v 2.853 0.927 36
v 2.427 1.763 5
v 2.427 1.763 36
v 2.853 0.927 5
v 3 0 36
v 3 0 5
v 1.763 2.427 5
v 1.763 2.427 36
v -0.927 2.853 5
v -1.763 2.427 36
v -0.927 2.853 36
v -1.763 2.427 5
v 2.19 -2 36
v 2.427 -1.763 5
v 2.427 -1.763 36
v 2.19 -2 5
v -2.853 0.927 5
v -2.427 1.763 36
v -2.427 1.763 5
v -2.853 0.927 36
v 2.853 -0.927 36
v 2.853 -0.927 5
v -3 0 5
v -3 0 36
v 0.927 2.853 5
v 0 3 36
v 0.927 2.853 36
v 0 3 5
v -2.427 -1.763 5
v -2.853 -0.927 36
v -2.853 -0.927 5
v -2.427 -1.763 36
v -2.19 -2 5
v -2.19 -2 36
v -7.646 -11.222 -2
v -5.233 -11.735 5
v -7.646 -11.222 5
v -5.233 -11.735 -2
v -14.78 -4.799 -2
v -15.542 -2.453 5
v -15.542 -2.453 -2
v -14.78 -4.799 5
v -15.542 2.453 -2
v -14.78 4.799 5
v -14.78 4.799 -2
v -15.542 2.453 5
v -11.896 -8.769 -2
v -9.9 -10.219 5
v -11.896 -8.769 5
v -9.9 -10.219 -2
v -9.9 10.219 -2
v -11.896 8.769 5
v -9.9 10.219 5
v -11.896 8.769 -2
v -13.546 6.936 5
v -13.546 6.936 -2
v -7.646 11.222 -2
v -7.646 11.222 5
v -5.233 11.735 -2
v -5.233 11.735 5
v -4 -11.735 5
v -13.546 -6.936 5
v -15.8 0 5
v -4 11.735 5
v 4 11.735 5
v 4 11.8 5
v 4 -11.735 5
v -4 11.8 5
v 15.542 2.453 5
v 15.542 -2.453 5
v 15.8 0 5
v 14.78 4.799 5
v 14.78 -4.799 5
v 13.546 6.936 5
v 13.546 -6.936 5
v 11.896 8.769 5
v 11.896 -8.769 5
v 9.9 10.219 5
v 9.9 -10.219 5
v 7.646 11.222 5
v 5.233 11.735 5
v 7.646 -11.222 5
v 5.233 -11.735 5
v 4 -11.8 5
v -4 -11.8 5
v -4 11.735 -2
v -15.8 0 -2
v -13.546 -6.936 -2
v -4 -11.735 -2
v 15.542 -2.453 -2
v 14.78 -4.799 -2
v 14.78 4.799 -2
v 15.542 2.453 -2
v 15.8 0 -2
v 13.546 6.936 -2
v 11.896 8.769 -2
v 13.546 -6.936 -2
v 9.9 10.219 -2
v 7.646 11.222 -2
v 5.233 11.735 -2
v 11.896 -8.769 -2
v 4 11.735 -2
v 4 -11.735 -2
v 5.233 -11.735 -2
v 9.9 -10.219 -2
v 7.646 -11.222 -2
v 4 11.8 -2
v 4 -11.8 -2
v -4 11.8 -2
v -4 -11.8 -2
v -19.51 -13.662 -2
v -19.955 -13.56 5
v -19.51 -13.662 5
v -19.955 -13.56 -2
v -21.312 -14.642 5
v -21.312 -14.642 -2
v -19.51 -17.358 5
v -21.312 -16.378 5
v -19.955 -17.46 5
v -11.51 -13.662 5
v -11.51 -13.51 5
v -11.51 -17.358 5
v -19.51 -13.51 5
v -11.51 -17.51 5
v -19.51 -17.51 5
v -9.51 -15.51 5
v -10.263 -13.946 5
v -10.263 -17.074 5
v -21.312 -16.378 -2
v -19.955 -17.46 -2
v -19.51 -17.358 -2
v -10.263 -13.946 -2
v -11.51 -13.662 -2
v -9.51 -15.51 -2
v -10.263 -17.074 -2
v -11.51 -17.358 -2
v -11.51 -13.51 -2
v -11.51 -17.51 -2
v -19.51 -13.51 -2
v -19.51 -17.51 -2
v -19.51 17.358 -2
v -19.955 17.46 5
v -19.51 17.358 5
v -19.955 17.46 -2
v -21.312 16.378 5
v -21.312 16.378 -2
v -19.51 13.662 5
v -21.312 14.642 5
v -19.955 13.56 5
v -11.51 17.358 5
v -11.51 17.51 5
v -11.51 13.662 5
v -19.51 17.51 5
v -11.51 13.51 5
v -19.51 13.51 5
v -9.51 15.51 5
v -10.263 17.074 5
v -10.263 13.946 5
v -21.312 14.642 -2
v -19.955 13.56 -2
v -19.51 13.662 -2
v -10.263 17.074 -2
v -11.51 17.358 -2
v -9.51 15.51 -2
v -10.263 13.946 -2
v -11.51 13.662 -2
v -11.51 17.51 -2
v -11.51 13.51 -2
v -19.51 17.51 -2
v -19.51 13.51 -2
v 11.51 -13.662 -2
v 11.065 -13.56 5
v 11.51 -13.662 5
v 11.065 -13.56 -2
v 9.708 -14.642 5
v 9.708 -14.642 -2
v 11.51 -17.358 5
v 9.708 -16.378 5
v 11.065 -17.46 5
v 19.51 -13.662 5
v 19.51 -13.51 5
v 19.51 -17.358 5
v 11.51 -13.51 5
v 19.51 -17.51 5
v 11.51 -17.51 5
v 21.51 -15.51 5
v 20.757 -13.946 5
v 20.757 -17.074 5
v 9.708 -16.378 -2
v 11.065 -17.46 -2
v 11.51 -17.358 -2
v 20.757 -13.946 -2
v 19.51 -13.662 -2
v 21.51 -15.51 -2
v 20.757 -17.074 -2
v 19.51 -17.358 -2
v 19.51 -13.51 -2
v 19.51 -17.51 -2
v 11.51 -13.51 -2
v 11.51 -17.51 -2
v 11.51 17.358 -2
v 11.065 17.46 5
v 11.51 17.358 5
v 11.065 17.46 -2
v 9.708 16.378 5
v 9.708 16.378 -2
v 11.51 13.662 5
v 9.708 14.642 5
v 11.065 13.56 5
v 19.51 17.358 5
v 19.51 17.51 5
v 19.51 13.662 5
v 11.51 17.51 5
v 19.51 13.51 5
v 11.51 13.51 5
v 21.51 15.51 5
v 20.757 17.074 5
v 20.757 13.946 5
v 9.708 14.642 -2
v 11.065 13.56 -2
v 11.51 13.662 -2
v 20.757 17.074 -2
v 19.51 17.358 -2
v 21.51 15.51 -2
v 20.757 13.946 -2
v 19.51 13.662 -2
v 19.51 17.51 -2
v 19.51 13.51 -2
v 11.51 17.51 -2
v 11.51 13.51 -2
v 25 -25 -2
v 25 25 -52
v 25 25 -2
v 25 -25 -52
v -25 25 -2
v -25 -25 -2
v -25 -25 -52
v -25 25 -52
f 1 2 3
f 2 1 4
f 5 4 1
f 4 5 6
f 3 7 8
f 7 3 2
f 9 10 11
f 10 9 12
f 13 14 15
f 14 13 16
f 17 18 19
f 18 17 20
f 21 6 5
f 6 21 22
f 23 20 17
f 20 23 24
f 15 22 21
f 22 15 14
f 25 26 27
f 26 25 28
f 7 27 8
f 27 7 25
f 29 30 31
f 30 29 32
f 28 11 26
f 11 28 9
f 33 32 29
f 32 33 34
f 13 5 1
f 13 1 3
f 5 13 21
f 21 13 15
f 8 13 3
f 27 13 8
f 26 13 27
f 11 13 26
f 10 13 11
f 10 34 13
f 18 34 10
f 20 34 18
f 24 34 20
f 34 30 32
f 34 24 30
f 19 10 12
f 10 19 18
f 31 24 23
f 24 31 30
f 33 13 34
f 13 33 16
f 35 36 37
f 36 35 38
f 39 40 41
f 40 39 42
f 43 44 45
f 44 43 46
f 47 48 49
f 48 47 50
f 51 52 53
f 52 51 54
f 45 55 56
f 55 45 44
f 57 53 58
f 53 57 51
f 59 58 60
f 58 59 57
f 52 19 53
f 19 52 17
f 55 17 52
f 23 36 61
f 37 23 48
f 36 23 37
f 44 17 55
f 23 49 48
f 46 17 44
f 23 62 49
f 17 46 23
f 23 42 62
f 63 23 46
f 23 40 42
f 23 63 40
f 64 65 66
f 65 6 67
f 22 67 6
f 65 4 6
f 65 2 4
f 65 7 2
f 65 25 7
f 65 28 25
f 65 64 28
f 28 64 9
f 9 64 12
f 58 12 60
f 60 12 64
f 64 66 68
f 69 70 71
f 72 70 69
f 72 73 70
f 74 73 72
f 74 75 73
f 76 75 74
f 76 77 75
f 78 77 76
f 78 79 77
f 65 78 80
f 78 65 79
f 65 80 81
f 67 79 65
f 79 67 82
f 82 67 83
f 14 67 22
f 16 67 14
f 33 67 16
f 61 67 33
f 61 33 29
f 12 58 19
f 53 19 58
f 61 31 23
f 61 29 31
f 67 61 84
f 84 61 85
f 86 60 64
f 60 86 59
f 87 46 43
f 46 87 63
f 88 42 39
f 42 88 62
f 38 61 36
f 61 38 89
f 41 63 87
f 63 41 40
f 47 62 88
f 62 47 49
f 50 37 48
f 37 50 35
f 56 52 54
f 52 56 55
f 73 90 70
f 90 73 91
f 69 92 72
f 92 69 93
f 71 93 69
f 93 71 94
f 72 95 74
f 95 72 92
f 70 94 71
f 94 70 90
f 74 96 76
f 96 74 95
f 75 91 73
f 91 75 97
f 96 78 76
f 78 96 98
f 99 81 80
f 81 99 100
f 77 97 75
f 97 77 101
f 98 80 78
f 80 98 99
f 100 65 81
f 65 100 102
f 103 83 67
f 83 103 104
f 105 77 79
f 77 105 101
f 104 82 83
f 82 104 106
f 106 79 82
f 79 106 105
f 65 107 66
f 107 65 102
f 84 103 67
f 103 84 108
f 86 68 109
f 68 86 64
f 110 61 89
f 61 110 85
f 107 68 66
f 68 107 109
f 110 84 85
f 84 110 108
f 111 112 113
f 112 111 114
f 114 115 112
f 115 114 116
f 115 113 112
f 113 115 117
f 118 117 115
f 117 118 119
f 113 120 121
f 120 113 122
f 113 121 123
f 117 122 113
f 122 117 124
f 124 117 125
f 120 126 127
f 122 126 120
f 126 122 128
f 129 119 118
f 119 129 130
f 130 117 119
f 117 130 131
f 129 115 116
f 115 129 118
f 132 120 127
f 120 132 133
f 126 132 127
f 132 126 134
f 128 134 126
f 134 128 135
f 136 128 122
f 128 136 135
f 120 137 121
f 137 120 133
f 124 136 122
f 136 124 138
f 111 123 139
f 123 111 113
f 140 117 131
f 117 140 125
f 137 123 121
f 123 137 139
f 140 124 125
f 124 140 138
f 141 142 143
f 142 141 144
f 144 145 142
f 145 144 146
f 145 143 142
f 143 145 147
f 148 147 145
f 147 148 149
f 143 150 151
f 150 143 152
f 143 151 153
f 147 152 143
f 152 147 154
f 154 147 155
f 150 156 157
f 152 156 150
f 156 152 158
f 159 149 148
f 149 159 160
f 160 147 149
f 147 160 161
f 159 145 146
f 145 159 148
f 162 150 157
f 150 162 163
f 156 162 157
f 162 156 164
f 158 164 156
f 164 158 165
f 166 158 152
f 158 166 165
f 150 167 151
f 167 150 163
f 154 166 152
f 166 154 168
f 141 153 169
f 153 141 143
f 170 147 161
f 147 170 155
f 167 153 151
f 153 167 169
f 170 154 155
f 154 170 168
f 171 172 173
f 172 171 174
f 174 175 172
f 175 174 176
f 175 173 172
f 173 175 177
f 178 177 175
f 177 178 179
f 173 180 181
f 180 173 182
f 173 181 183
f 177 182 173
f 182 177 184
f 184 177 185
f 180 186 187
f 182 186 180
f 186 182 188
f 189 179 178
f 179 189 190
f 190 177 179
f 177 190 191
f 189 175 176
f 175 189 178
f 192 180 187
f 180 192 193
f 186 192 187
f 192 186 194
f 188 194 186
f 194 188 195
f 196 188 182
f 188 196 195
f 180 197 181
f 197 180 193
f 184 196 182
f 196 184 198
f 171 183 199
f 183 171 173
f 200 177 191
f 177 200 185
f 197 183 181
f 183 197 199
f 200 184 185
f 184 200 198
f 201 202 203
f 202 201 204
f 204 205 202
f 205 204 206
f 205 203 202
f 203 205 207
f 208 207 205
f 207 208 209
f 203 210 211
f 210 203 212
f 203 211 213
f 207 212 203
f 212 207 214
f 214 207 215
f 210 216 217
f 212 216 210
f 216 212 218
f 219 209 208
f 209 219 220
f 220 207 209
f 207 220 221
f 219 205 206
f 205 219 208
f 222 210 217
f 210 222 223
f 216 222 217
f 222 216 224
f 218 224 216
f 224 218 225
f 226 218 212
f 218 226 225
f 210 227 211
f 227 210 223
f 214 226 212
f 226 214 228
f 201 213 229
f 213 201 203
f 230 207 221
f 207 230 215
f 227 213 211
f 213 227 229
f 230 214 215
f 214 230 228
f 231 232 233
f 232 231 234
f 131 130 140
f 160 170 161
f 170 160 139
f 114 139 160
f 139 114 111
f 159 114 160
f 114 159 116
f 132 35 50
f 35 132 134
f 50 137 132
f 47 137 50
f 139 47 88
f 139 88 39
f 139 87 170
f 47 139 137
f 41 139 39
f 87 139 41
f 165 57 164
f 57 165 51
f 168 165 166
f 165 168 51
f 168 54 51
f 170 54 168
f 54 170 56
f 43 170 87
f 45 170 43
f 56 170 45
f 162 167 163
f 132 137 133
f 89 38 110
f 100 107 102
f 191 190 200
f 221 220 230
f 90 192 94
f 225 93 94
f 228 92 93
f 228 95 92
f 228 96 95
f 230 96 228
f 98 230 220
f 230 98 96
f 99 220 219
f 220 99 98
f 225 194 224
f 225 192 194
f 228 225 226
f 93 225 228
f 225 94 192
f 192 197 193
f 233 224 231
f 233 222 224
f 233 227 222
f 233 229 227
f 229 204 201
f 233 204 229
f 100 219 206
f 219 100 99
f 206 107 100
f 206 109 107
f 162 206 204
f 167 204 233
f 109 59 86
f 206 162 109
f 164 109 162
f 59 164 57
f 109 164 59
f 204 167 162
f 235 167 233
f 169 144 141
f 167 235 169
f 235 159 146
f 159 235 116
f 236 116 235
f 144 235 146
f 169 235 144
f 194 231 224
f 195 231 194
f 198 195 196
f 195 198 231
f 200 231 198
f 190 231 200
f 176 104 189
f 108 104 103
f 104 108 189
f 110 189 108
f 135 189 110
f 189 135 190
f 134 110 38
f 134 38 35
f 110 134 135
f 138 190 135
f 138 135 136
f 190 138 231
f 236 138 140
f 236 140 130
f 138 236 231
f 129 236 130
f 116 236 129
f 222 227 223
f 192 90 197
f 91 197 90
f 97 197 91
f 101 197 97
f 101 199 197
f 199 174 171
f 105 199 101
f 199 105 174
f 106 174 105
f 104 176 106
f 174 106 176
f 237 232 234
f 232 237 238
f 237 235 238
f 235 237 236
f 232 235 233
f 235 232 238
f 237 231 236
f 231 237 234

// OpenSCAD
/*
 * Written by Dermot Tynan, Kalopa Research.
 * GPLv2.
 *
 * All dimensions are in mm.
 */
module elongated_cylinder(er, eh, s)
{
	if (s > 0) {
		union() {
			translate([-s, 0, 0]) cylinder(r = er, h = eh, center = true);
			translate([s, 0, 0]) cylinder(r = er, h = eh, center = true);
			cube([s * 2, er * 2, eh], center = true);
		}
	} else {
		cylinder(r = er, h = eh, center = true);
	}
}

module nema17_shaft()
{
	difference() {
		cylinder(r = 6/2, h = 50, center = true, $fn = 20);
		translate([0, -4.5, 0]) cube([5, 5, 55], center = true);
	}
}

module nema17_motor(s)
{
	union() {
		translate([0, 0, 11]) nema17_shaft();
		elongated_cylinder(11.8, 10, s);
		translate([-15.51, -15.51, 0]) elongated_cylinder(2, 10, s);
		translate([-15.51, 15.51, 0]) elongated_cylinder(2, 10, s);
		translate([15.51, -15.51, 0]) elongated_cylinder(2, 10, s);
		translate([15.51, 15.51, 0]) elongated_cylinder(2, 10, s);
		translate([0, 0, -27]) cube(42 + 2*s, 42, 47, center = true);
	}
}

nema17_motor(4);
